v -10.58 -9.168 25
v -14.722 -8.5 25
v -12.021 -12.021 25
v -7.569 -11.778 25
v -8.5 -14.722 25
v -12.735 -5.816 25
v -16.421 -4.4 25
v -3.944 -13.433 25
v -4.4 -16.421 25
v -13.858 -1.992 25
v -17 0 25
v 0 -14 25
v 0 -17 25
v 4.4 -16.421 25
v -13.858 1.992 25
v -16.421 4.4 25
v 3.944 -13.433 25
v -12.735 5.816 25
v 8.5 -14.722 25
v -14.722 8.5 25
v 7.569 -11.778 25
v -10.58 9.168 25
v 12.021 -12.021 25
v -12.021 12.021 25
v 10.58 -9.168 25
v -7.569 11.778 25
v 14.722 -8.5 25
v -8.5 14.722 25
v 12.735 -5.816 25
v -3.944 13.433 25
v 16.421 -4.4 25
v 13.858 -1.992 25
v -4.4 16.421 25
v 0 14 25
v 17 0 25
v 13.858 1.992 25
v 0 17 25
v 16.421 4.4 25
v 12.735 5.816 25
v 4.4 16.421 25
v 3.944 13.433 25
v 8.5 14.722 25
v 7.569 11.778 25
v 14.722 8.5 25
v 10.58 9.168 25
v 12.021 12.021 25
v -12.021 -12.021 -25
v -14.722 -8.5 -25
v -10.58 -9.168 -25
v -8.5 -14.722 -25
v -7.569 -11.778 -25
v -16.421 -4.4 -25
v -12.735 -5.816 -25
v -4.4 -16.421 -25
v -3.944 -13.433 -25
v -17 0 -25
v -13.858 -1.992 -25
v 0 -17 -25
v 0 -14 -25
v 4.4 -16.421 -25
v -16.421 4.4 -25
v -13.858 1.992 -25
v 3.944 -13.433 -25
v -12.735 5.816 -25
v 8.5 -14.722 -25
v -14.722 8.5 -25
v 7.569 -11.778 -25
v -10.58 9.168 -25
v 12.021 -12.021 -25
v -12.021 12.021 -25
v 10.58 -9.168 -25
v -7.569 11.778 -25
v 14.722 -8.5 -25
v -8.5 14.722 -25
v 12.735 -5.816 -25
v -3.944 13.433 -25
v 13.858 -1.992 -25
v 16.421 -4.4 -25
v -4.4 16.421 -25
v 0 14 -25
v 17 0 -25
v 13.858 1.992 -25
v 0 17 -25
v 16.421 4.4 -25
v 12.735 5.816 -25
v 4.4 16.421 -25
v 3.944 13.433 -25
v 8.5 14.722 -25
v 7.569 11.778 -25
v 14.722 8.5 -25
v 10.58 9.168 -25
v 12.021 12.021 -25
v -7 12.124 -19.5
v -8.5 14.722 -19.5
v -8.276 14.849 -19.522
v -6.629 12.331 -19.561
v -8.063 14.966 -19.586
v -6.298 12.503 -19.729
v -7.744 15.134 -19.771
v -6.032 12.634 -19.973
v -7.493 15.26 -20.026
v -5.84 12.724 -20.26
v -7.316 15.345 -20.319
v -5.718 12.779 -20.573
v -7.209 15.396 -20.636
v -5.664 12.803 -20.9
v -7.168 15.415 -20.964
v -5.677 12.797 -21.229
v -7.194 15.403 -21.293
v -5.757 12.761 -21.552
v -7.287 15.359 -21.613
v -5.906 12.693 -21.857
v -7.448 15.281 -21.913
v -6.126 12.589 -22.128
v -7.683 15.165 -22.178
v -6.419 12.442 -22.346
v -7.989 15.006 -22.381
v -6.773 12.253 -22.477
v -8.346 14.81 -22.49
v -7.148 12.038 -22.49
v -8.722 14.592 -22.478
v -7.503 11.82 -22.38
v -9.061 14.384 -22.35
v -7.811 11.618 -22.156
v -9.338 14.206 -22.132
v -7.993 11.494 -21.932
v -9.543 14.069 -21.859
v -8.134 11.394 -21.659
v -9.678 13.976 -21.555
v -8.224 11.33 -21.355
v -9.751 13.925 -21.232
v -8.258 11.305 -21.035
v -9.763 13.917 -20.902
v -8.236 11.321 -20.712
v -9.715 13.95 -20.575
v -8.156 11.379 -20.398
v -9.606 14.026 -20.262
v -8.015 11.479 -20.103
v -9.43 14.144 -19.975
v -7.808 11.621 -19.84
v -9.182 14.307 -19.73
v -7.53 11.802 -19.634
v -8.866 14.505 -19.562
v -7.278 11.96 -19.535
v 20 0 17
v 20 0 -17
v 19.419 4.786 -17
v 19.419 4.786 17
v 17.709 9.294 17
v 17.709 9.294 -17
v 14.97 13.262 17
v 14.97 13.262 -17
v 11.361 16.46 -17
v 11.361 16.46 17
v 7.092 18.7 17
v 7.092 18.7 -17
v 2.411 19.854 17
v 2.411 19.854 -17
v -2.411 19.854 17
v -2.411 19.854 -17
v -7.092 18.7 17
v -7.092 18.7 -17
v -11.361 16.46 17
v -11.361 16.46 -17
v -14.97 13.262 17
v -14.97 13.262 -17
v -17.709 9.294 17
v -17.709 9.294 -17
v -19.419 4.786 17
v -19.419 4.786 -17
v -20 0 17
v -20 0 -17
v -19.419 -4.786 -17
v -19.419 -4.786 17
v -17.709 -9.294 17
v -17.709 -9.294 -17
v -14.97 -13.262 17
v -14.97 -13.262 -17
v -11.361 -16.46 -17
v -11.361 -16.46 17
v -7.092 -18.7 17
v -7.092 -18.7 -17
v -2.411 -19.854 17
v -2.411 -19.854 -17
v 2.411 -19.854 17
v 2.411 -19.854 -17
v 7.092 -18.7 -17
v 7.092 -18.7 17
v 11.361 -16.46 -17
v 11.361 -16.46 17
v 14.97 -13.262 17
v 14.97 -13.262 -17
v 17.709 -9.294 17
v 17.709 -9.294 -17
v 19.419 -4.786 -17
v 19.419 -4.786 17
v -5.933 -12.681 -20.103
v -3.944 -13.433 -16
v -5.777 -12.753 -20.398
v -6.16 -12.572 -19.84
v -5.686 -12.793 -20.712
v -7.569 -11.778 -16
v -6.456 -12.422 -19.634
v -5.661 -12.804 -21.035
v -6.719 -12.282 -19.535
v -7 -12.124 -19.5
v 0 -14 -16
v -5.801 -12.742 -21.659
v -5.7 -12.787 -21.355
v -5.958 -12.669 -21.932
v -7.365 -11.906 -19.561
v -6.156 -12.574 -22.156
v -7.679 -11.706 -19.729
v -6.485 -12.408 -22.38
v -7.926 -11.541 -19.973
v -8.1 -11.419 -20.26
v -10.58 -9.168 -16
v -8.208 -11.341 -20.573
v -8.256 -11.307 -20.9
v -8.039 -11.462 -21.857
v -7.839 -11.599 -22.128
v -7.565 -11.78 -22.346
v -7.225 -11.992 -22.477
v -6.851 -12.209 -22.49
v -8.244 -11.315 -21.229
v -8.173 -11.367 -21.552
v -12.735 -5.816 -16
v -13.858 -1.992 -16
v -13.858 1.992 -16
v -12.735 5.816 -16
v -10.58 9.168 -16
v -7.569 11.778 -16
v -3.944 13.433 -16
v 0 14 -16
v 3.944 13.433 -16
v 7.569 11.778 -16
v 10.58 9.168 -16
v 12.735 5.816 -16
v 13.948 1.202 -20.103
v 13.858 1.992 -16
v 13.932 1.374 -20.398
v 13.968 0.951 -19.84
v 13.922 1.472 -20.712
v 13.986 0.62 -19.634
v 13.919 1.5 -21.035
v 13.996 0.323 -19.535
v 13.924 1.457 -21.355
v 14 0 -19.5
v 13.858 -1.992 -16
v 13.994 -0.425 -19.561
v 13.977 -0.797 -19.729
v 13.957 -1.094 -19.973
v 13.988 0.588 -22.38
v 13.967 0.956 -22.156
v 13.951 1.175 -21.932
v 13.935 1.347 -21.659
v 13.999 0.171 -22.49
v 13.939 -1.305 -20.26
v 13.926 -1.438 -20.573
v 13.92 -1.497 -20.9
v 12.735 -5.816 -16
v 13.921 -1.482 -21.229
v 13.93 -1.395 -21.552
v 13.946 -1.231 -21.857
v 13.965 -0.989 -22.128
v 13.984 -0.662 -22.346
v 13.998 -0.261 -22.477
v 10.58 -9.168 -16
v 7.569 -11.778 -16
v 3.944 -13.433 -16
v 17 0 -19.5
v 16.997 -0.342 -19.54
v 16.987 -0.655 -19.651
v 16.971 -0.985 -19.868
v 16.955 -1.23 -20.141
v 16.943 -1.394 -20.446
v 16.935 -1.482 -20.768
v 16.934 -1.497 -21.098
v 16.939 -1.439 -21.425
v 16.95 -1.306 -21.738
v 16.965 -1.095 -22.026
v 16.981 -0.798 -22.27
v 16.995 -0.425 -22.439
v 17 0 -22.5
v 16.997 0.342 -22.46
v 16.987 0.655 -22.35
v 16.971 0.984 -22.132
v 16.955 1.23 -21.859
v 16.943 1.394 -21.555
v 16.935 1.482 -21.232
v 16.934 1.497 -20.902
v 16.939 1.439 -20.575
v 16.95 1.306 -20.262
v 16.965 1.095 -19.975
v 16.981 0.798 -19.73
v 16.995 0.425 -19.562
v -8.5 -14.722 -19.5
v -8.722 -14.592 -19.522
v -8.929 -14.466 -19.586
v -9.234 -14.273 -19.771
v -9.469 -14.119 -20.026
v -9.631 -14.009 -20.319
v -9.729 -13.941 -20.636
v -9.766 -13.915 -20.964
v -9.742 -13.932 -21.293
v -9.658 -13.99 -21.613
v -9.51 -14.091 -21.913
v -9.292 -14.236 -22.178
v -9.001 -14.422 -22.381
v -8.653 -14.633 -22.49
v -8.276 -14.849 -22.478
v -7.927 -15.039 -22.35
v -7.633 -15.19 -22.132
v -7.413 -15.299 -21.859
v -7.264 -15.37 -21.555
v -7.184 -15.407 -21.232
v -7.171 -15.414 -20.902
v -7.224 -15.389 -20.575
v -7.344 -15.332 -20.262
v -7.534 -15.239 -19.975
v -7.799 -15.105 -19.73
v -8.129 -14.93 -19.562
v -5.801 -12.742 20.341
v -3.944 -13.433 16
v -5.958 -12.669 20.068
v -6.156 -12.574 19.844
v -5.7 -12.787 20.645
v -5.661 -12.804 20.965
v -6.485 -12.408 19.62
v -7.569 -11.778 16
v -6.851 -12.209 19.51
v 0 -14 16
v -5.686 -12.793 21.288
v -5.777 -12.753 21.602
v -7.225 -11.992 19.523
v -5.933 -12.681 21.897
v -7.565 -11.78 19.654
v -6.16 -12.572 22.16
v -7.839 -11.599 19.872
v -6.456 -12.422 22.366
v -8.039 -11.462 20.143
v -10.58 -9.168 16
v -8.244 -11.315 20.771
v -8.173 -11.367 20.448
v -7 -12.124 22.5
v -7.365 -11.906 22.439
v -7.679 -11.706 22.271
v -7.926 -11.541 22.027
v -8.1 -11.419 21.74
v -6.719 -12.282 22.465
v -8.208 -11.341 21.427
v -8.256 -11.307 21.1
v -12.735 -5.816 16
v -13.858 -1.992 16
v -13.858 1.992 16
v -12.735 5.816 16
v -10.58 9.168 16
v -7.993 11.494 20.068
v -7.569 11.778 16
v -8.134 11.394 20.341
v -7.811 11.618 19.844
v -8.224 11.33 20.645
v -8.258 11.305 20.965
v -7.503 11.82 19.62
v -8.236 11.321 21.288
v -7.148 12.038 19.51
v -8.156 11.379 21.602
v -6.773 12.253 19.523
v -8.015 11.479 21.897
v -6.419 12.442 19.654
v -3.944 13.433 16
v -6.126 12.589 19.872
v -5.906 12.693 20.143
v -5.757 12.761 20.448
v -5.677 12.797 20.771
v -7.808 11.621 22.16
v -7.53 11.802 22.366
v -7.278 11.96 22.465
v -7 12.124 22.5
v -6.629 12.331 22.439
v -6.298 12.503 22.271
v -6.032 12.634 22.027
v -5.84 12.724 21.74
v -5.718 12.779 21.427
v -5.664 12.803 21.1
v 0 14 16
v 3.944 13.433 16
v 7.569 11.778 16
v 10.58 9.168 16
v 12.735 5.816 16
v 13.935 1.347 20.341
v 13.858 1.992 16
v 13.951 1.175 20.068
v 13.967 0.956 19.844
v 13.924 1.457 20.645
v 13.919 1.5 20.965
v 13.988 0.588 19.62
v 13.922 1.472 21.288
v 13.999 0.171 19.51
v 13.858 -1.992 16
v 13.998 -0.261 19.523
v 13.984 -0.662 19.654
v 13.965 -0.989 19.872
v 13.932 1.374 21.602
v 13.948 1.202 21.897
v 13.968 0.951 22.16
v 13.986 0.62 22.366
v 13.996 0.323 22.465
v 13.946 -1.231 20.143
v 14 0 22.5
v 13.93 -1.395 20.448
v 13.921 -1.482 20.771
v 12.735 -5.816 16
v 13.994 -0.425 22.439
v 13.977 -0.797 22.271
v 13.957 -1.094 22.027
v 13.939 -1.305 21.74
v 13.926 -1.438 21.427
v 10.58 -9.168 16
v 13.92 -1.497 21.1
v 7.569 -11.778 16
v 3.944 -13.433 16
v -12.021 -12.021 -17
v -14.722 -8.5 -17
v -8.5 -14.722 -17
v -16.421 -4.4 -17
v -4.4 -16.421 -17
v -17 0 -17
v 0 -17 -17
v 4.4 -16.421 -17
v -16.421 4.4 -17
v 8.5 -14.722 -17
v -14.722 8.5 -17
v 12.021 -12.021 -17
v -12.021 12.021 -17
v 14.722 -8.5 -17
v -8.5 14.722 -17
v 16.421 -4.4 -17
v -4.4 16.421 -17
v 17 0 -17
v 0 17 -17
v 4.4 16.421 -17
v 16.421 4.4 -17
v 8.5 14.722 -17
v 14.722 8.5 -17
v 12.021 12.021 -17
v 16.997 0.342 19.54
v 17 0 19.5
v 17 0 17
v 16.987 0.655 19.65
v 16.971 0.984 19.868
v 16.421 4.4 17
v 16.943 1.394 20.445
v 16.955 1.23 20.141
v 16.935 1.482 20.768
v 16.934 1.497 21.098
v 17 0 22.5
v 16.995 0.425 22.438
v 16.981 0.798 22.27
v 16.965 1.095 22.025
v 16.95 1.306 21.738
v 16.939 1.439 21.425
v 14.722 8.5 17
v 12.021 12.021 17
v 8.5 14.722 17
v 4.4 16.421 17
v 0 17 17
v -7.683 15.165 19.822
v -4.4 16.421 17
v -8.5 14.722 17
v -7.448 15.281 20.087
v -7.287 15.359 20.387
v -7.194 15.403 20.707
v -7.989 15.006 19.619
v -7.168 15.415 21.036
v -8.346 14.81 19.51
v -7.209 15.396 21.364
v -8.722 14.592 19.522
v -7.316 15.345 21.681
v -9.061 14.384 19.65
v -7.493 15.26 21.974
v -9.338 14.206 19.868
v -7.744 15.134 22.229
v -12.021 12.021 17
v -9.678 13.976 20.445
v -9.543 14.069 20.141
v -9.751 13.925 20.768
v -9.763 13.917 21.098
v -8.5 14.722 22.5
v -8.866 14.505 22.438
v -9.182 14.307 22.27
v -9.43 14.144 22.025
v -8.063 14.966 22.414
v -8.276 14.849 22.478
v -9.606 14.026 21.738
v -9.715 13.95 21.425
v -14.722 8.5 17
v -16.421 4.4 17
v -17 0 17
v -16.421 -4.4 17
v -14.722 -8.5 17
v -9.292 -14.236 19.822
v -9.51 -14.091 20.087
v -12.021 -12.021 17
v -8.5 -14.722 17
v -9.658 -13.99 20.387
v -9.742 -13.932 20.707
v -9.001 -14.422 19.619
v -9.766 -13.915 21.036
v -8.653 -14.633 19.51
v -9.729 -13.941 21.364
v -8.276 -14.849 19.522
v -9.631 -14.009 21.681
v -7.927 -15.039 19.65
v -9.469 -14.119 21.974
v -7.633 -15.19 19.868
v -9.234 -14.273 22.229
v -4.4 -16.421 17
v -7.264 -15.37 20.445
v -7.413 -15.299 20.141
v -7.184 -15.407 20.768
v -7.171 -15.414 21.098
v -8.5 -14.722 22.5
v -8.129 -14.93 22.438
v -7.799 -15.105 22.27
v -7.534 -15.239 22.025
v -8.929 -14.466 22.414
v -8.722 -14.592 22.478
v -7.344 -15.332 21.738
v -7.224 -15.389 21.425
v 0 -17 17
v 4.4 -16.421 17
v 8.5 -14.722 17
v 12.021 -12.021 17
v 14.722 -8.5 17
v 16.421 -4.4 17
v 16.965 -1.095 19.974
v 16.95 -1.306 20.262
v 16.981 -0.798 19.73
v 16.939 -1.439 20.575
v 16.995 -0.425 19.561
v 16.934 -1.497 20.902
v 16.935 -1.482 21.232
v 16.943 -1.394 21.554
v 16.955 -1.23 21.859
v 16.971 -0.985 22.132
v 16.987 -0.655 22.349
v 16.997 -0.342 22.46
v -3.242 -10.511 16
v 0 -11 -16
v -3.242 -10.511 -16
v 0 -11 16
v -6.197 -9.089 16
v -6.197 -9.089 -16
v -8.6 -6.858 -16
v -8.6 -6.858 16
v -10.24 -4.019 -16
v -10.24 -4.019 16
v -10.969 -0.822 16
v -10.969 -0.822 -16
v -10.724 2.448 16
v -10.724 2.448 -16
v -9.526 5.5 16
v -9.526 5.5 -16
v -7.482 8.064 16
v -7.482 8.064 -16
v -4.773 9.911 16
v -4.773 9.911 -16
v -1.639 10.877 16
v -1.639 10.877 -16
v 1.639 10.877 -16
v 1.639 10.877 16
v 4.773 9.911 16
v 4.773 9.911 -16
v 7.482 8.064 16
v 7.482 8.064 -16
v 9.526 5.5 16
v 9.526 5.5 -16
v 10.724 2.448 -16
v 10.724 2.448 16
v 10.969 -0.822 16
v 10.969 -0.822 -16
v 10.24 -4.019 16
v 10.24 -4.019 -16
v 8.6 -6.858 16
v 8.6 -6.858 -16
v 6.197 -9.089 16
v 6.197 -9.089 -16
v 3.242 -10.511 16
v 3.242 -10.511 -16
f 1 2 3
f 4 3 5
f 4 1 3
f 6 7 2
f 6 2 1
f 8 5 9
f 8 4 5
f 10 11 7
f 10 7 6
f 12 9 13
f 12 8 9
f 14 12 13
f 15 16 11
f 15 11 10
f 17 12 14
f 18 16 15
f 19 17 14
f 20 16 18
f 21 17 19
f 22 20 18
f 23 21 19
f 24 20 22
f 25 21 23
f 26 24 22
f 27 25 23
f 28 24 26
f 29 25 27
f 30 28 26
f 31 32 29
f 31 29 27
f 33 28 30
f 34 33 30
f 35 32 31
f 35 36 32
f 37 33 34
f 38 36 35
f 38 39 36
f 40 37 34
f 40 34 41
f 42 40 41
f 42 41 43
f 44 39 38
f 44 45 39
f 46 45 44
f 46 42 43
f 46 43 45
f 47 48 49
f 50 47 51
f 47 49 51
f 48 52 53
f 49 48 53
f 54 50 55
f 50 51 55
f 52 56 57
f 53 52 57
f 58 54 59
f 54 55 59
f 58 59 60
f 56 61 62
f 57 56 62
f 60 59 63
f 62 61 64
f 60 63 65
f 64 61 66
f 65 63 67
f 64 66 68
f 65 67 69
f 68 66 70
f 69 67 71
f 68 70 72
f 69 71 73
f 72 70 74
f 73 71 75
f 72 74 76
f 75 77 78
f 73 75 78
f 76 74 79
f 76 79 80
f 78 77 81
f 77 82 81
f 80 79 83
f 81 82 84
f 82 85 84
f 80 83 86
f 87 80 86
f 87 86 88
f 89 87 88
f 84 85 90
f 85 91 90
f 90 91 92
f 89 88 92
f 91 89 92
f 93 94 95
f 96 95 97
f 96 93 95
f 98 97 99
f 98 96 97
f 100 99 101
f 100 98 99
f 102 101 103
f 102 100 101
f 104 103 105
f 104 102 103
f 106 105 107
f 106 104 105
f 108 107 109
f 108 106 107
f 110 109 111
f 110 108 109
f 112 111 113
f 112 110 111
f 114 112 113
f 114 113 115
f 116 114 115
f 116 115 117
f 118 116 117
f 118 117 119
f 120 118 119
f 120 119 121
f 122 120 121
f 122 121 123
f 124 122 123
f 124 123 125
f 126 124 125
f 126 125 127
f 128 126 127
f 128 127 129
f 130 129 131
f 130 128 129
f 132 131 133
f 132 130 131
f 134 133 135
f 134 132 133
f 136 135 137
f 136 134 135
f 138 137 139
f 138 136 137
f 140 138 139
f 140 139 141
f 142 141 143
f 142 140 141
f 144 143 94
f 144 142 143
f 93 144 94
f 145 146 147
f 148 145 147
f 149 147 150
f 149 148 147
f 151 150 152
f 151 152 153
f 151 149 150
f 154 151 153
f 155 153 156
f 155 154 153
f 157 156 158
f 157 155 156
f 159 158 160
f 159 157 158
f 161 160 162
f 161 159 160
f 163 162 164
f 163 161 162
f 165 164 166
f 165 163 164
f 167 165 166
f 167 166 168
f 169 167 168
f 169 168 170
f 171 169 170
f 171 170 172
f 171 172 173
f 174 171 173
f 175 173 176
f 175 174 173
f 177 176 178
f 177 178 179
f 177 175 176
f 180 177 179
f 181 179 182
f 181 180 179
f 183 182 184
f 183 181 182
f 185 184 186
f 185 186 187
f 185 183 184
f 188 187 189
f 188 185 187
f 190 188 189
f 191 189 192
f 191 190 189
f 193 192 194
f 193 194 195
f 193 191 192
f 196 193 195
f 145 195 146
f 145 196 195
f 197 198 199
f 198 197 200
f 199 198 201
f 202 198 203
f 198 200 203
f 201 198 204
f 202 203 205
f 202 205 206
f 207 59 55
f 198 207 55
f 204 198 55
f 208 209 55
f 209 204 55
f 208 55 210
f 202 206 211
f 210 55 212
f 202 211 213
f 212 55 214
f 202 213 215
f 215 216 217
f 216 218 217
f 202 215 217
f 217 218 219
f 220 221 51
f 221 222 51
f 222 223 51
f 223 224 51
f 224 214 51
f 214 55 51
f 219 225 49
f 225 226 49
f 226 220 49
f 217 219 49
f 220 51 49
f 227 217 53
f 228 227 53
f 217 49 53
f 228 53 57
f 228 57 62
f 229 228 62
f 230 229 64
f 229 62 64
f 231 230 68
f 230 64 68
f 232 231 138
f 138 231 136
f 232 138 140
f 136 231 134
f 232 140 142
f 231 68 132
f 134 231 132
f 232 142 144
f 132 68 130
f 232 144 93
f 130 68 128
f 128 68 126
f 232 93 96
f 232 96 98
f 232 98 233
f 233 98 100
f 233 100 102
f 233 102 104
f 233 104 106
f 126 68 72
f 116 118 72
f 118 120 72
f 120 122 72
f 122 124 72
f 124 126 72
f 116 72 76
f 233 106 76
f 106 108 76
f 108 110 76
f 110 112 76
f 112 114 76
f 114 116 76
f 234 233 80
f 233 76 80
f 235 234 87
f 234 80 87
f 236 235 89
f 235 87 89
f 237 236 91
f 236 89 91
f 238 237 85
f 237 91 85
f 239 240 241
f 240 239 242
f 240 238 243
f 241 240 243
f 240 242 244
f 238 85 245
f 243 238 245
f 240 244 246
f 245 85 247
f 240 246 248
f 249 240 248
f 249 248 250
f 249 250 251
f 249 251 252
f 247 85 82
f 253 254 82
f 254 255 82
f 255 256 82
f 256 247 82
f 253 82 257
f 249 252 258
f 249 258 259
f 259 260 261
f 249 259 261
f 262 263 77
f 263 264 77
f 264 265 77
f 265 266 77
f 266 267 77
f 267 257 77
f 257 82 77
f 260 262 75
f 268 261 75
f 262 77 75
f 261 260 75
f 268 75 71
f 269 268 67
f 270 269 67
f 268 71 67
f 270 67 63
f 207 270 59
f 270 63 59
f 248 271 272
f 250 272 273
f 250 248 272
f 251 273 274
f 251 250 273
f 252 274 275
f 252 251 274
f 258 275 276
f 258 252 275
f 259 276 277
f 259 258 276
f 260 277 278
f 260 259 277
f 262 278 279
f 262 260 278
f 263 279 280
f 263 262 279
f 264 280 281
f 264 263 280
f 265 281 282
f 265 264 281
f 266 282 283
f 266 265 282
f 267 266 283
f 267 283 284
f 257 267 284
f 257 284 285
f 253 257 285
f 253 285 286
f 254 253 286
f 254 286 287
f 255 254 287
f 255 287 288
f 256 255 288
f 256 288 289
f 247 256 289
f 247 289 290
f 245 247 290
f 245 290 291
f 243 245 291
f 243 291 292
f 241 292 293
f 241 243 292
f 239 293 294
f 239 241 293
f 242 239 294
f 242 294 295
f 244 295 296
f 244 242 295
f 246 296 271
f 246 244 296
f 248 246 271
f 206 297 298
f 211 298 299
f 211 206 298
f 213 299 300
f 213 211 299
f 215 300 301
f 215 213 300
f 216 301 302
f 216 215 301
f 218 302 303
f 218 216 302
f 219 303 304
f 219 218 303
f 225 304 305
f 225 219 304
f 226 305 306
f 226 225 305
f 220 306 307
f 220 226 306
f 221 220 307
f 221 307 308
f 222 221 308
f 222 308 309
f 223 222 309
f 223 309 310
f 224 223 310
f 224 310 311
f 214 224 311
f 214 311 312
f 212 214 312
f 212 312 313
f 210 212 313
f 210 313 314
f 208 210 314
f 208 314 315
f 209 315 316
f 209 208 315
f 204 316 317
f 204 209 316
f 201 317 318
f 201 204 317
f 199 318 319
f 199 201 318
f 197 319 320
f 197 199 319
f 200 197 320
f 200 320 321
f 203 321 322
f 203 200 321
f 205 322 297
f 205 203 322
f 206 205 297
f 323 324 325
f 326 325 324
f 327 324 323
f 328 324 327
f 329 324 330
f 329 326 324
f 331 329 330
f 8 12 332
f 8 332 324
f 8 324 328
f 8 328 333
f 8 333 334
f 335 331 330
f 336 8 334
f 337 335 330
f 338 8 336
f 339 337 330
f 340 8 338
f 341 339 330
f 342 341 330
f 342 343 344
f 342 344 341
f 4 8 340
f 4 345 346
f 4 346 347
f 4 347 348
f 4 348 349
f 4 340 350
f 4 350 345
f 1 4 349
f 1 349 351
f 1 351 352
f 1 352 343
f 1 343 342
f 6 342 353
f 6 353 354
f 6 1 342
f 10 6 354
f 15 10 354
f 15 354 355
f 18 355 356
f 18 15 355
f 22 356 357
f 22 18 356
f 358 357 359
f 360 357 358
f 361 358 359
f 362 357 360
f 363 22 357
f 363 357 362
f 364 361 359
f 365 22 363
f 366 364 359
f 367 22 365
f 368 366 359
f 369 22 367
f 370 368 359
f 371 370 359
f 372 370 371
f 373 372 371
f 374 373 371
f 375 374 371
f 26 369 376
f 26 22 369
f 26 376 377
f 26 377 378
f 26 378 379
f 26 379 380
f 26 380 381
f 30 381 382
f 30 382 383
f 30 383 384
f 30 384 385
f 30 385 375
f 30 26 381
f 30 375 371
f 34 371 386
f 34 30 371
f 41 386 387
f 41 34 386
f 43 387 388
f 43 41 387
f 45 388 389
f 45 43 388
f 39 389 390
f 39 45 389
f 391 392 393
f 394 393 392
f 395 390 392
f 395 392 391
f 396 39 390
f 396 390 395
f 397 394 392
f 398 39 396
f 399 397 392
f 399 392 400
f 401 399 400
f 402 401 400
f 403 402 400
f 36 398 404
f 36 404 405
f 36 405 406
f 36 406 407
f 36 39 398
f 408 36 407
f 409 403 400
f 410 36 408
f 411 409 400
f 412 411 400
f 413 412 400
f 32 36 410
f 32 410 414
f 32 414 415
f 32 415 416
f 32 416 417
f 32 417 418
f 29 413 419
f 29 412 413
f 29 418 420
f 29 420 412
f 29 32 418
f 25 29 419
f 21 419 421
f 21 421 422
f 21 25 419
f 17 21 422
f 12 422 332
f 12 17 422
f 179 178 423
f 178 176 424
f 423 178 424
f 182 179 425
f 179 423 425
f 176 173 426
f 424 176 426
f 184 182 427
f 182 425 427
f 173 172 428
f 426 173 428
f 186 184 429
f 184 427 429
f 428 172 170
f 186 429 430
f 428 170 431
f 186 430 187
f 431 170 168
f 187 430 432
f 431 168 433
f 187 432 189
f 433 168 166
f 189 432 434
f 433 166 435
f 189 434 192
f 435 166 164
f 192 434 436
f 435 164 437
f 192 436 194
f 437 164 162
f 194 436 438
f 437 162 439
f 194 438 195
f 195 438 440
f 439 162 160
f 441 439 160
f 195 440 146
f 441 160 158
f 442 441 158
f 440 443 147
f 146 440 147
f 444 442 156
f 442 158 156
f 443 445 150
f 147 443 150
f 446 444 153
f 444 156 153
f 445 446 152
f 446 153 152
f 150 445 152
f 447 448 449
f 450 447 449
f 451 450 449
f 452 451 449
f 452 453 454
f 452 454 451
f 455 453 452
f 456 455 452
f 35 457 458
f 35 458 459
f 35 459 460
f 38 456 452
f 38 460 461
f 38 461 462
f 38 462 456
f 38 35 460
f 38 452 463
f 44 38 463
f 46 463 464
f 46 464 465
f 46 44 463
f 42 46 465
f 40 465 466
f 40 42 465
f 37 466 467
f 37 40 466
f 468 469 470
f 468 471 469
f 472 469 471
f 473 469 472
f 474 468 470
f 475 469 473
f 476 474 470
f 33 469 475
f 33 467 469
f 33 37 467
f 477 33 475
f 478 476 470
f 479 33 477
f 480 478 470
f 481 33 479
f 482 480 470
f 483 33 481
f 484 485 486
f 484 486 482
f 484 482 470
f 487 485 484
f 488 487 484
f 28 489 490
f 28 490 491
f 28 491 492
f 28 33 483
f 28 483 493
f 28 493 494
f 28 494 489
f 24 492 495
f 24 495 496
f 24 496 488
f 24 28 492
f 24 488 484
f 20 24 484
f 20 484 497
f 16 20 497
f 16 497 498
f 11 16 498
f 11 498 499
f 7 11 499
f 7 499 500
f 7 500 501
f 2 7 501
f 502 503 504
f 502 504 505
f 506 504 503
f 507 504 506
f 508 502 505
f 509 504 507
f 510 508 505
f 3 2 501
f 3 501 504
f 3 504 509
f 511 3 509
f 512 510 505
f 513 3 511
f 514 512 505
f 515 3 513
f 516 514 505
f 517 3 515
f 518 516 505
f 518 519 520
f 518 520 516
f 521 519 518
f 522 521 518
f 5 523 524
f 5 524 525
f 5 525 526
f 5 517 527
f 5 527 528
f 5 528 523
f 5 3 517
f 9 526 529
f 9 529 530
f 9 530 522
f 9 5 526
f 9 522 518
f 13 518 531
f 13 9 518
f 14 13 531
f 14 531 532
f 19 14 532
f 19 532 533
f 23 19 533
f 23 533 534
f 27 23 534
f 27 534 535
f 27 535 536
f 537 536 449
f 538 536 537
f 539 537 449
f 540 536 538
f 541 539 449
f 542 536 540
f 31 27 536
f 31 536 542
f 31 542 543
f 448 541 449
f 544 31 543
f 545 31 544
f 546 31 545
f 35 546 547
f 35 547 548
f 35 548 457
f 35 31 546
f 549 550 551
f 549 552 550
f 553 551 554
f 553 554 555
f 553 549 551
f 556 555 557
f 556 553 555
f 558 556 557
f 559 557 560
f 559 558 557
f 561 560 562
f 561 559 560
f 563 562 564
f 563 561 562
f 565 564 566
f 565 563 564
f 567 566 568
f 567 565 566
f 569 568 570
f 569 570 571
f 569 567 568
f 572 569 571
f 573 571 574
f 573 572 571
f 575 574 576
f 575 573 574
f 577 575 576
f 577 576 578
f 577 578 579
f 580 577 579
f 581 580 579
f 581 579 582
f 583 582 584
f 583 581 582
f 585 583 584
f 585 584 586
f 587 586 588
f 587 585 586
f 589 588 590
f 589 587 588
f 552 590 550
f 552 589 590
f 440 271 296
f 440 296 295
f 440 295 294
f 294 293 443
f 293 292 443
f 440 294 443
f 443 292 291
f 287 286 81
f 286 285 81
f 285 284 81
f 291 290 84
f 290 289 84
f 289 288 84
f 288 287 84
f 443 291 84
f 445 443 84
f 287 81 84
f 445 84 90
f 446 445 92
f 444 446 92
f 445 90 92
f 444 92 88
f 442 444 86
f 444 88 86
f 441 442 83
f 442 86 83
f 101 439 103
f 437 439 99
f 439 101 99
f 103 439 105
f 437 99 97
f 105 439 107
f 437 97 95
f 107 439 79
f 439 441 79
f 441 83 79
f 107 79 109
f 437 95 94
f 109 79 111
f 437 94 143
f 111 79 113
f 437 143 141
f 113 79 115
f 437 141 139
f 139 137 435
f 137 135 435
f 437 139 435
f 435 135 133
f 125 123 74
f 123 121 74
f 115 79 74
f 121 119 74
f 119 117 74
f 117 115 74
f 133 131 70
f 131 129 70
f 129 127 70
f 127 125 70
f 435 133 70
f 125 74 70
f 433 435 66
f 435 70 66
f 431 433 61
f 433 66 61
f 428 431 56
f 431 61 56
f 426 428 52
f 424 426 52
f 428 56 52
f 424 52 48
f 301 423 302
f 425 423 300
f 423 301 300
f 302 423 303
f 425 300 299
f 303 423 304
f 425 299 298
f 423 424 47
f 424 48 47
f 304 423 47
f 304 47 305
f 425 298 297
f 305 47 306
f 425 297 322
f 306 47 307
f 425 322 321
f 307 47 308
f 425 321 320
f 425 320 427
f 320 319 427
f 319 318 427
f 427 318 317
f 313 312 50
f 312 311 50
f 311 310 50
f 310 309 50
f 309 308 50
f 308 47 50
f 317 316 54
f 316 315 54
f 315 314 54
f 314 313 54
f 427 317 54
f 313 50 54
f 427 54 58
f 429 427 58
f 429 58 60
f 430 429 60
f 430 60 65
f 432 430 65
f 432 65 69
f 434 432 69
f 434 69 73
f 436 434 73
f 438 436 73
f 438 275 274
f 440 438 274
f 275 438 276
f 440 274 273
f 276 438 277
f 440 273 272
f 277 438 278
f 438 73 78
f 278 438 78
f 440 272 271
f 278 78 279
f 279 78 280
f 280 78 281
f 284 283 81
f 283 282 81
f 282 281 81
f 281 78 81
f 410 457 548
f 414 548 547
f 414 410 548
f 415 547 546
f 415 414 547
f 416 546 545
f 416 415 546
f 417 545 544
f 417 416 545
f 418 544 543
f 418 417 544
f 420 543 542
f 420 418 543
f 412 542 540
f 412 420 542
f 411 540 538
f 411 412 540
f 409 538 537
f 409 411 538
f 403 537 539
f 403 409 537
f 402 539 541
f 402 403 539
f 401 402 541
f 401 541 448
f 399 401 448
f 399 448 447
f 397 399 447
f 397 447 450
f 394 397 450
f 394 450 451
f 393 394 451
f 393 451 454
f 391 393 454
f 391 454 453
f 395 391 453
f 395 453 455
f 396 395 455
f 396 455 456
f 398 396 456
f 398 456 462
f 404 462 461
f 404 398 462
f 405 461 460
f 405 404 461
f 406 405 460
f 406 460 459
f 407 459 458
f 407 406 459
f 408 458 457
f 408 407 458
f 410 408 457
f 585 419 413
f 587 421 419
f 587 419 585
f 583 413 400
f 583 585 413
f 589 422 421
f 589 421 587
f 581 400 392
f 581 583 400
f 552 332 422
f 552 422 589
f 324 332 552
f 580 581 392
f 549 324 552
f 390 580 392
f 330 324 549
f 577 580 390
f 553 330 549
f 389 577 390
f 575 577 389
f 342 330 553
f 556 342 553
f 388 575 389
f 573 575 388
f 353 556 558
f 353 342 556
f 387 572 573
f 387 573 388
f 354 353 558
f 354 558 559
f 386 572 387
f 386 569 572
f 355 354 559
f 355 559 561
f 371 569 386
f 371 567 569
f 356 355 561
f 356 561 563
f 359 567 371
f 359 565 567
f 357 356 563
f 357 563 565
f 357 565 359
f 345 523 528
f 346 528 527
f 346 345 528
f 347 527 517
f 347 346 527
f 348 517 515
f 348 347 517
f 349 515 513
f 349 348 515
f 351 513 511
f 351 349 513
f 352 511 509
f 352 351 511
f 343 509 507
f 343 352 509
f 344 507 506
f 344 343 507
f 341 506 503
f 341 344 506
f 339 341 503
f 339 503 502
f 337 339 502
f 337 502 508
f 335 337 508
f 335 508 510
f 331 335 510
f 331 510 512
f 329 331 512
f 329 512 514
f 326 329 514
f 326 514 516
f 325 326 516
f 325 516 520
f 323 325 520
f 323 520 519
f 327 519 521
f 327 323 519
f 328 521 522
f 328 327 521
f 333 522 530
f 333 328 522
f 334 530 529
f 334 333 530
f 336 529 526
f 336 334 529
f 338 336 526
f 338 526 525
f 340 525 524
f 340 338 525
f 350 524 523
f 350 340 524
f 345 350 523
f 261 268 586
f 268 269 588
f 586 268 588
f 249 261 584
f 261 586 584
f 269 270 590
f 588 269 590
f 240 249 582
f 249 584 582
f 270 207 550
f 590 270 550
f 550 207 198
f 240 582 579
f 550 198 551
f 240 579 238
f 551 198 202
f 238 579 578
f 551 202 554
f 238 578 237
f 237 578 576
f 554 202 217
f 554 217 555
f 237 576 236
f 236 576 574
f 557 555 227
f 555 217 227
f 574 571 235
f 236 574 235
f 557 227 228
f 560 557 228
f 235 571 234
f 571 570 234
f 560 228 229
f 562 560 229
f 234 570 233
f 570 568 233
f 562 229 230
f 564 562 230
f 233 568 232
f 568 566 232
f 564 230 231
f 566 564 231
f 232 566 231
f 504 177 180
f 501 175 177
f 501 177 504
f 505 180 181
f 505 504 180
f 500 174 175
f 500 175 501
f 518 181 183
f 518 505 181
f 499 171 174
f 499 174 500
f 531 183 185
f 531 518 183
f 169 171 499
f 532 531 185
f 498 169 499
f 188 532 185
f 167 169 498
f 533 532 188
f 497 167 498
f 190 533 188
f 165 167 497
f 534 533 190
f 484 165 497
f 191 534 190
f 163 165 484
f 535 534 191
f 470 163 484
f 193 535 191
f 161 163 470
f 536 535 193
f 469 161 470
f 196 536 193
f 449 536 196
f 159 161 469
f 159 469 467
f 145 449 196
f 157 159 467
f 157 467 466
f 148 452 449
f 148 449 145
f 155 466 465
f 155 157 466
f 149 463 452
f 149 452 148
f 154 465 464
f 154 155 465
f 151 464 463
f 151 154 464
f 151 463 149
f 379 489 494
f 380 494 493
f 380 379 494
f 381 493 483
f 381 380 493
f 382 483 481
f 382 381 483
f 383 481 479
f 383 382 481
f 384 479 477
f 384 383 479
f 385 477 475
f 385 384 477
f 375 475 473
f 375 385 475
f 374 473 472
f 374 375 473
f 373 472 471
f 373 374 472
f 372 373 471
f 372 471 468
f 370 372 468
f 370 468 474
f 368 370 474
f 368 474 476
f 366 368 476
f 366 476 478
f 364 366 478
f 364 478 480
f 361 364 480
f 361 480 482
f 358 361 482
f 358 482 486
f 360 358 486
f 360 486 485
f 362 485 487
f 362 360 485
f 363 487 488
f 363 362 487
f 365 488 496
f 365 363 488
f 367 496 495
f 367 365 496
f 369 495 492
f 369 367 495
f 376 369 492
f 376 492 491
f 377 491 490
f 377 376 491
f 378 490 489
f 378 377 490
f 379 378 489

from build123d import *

# Parameters (mm, degrees)
SKETCH1_R               = 20
BOSS_EXTRUDE1_DEPTH     = 25
SKETCH4_R               = 20
SKETCH4_R_2             = 17
CUT_EXTRUDE1_DEPTH      = 8
CUT_EXTRUDE2_REACH      = 39.749
CUT_EXTRUDE2_END_RADIUS = 17
SKETCH5_R               = 1.5
CIRPATTERN1_COUNT       = 3


with BuildPart() as part:
    # Sketch1 → Boss-Extrude1 (new, symmetric)
    with BuildSketch(Plane.XY):
        Circle(SKETCH1_R)
    extrude(amount=BOSS_EXTRUDE1_DEPTH, both=True)

    # Sketch3 → Hole1 (revolve, cut)
    with BuildSketch(Plane(origin=(0, 0, 25), x_dir=(0, -1, 0), z_dir=(1, 0, 0))):
        Polygon((0, 0), (0, 56.609466809), (11, 50), (11, 9), (14, 9), (14, 0), align=None)
    hole1 = revolve(axis=Axis((0, 0, 36.310875039), (0, 0, -1)), mode=Mode.SUBTRACT)

    # Sketch4 → Cut-Extrude1 (cut)
    with BuildSketch(Plane.XY.offset(25)):
        Circle(SKETCH4_R)
        Circle(SKETCH4_R_2, mode=Mode.SUBTRACT)
    cut_extrude1 = extrude(amount=-CUT_EXTRUDE1_DEPTH, mode=Mode.SUBTRACT)

    # Mirror2: Hole1, Cut-Extrude1 across plane
    add(hole1.mirror(Plane.XY), mode=Mode.SUBTRACT)
    add(cut_extrude1.mirror(Plane.XY), mode=Mode.SUBTRACT)

    # Cut-Extrude2: up to this cylinder (the profile starts inside it)
    cut_extrude2_end = Plane(origin=(0, 0, 0), z_dir=(0, 0, 1)) * Cylinder(CUT_EXTRUDE2_END_RADIUS, 156.498, mode=Mode.PRIVATE)
    # Sketch5 → Cut-Extrude2 (cut, up to the surface)
    with BuildSketch(Plane(origin=(0, 0, 0), x_dir=(0, 0, -1), z_dir=(1, 0, 0)), mode=Mode.PRIVATE) as cut_extrude2_sk1:
        with Locations(Location((-21, 0, 0), (0, 0, 180))):
            Circle(SKETCH5_R)
    cut_extrude2_tool1 = extrude(cut_extrude2_sk1.sketch, amount=CUT_EXTRUDE2_REACH, mode=Mode.PRIVATE) & cut_extrude2_end
    # Sketch5 → Cut-Extrude2 (cut, up to the surface)
    with BuildSketch(Plane(origin=(0, 0, 0), x_dir=(0, 0, -1), z_dir=(1, 0, 0)), mode=Mode.PRIVATE) as cut_extrude2_sk2:
        with Locations(Location((21, 0, 0), (0, 0, 180))):
            Circle(SKETCH5_R)
    cut_extrude2_tool2 = extrude(cut_extrude2_sk2.sketch, amount=CUT_EXTRUDE2_REACH, mode=Mode.PRIVATE) & cut_extrude2_end
    cut_extrude2 = cut_extrude2_tool1.solids().sort_by_distance((0, 0, 21))[0] + cut_extrude2_tool2.solids().sort_by_distance((0, 0, -21))[0]
    add(cut_extrude2, mode=Mode.SUBTRACT)

    # CirPattern1: Cut-Extrude2 ×3 about axis
    cirpattern1_axis = Axis((0, 0, 25), (0, 0, 1))
    for i in range(1, CIRPATTERN1_COUNT):
        add(cut_extrude2.rotate(cirpattern1_axis, i * 360 / CIRPATTERN1_COUNT), mode=Mode.SUBTRACT)


solid = part.part
